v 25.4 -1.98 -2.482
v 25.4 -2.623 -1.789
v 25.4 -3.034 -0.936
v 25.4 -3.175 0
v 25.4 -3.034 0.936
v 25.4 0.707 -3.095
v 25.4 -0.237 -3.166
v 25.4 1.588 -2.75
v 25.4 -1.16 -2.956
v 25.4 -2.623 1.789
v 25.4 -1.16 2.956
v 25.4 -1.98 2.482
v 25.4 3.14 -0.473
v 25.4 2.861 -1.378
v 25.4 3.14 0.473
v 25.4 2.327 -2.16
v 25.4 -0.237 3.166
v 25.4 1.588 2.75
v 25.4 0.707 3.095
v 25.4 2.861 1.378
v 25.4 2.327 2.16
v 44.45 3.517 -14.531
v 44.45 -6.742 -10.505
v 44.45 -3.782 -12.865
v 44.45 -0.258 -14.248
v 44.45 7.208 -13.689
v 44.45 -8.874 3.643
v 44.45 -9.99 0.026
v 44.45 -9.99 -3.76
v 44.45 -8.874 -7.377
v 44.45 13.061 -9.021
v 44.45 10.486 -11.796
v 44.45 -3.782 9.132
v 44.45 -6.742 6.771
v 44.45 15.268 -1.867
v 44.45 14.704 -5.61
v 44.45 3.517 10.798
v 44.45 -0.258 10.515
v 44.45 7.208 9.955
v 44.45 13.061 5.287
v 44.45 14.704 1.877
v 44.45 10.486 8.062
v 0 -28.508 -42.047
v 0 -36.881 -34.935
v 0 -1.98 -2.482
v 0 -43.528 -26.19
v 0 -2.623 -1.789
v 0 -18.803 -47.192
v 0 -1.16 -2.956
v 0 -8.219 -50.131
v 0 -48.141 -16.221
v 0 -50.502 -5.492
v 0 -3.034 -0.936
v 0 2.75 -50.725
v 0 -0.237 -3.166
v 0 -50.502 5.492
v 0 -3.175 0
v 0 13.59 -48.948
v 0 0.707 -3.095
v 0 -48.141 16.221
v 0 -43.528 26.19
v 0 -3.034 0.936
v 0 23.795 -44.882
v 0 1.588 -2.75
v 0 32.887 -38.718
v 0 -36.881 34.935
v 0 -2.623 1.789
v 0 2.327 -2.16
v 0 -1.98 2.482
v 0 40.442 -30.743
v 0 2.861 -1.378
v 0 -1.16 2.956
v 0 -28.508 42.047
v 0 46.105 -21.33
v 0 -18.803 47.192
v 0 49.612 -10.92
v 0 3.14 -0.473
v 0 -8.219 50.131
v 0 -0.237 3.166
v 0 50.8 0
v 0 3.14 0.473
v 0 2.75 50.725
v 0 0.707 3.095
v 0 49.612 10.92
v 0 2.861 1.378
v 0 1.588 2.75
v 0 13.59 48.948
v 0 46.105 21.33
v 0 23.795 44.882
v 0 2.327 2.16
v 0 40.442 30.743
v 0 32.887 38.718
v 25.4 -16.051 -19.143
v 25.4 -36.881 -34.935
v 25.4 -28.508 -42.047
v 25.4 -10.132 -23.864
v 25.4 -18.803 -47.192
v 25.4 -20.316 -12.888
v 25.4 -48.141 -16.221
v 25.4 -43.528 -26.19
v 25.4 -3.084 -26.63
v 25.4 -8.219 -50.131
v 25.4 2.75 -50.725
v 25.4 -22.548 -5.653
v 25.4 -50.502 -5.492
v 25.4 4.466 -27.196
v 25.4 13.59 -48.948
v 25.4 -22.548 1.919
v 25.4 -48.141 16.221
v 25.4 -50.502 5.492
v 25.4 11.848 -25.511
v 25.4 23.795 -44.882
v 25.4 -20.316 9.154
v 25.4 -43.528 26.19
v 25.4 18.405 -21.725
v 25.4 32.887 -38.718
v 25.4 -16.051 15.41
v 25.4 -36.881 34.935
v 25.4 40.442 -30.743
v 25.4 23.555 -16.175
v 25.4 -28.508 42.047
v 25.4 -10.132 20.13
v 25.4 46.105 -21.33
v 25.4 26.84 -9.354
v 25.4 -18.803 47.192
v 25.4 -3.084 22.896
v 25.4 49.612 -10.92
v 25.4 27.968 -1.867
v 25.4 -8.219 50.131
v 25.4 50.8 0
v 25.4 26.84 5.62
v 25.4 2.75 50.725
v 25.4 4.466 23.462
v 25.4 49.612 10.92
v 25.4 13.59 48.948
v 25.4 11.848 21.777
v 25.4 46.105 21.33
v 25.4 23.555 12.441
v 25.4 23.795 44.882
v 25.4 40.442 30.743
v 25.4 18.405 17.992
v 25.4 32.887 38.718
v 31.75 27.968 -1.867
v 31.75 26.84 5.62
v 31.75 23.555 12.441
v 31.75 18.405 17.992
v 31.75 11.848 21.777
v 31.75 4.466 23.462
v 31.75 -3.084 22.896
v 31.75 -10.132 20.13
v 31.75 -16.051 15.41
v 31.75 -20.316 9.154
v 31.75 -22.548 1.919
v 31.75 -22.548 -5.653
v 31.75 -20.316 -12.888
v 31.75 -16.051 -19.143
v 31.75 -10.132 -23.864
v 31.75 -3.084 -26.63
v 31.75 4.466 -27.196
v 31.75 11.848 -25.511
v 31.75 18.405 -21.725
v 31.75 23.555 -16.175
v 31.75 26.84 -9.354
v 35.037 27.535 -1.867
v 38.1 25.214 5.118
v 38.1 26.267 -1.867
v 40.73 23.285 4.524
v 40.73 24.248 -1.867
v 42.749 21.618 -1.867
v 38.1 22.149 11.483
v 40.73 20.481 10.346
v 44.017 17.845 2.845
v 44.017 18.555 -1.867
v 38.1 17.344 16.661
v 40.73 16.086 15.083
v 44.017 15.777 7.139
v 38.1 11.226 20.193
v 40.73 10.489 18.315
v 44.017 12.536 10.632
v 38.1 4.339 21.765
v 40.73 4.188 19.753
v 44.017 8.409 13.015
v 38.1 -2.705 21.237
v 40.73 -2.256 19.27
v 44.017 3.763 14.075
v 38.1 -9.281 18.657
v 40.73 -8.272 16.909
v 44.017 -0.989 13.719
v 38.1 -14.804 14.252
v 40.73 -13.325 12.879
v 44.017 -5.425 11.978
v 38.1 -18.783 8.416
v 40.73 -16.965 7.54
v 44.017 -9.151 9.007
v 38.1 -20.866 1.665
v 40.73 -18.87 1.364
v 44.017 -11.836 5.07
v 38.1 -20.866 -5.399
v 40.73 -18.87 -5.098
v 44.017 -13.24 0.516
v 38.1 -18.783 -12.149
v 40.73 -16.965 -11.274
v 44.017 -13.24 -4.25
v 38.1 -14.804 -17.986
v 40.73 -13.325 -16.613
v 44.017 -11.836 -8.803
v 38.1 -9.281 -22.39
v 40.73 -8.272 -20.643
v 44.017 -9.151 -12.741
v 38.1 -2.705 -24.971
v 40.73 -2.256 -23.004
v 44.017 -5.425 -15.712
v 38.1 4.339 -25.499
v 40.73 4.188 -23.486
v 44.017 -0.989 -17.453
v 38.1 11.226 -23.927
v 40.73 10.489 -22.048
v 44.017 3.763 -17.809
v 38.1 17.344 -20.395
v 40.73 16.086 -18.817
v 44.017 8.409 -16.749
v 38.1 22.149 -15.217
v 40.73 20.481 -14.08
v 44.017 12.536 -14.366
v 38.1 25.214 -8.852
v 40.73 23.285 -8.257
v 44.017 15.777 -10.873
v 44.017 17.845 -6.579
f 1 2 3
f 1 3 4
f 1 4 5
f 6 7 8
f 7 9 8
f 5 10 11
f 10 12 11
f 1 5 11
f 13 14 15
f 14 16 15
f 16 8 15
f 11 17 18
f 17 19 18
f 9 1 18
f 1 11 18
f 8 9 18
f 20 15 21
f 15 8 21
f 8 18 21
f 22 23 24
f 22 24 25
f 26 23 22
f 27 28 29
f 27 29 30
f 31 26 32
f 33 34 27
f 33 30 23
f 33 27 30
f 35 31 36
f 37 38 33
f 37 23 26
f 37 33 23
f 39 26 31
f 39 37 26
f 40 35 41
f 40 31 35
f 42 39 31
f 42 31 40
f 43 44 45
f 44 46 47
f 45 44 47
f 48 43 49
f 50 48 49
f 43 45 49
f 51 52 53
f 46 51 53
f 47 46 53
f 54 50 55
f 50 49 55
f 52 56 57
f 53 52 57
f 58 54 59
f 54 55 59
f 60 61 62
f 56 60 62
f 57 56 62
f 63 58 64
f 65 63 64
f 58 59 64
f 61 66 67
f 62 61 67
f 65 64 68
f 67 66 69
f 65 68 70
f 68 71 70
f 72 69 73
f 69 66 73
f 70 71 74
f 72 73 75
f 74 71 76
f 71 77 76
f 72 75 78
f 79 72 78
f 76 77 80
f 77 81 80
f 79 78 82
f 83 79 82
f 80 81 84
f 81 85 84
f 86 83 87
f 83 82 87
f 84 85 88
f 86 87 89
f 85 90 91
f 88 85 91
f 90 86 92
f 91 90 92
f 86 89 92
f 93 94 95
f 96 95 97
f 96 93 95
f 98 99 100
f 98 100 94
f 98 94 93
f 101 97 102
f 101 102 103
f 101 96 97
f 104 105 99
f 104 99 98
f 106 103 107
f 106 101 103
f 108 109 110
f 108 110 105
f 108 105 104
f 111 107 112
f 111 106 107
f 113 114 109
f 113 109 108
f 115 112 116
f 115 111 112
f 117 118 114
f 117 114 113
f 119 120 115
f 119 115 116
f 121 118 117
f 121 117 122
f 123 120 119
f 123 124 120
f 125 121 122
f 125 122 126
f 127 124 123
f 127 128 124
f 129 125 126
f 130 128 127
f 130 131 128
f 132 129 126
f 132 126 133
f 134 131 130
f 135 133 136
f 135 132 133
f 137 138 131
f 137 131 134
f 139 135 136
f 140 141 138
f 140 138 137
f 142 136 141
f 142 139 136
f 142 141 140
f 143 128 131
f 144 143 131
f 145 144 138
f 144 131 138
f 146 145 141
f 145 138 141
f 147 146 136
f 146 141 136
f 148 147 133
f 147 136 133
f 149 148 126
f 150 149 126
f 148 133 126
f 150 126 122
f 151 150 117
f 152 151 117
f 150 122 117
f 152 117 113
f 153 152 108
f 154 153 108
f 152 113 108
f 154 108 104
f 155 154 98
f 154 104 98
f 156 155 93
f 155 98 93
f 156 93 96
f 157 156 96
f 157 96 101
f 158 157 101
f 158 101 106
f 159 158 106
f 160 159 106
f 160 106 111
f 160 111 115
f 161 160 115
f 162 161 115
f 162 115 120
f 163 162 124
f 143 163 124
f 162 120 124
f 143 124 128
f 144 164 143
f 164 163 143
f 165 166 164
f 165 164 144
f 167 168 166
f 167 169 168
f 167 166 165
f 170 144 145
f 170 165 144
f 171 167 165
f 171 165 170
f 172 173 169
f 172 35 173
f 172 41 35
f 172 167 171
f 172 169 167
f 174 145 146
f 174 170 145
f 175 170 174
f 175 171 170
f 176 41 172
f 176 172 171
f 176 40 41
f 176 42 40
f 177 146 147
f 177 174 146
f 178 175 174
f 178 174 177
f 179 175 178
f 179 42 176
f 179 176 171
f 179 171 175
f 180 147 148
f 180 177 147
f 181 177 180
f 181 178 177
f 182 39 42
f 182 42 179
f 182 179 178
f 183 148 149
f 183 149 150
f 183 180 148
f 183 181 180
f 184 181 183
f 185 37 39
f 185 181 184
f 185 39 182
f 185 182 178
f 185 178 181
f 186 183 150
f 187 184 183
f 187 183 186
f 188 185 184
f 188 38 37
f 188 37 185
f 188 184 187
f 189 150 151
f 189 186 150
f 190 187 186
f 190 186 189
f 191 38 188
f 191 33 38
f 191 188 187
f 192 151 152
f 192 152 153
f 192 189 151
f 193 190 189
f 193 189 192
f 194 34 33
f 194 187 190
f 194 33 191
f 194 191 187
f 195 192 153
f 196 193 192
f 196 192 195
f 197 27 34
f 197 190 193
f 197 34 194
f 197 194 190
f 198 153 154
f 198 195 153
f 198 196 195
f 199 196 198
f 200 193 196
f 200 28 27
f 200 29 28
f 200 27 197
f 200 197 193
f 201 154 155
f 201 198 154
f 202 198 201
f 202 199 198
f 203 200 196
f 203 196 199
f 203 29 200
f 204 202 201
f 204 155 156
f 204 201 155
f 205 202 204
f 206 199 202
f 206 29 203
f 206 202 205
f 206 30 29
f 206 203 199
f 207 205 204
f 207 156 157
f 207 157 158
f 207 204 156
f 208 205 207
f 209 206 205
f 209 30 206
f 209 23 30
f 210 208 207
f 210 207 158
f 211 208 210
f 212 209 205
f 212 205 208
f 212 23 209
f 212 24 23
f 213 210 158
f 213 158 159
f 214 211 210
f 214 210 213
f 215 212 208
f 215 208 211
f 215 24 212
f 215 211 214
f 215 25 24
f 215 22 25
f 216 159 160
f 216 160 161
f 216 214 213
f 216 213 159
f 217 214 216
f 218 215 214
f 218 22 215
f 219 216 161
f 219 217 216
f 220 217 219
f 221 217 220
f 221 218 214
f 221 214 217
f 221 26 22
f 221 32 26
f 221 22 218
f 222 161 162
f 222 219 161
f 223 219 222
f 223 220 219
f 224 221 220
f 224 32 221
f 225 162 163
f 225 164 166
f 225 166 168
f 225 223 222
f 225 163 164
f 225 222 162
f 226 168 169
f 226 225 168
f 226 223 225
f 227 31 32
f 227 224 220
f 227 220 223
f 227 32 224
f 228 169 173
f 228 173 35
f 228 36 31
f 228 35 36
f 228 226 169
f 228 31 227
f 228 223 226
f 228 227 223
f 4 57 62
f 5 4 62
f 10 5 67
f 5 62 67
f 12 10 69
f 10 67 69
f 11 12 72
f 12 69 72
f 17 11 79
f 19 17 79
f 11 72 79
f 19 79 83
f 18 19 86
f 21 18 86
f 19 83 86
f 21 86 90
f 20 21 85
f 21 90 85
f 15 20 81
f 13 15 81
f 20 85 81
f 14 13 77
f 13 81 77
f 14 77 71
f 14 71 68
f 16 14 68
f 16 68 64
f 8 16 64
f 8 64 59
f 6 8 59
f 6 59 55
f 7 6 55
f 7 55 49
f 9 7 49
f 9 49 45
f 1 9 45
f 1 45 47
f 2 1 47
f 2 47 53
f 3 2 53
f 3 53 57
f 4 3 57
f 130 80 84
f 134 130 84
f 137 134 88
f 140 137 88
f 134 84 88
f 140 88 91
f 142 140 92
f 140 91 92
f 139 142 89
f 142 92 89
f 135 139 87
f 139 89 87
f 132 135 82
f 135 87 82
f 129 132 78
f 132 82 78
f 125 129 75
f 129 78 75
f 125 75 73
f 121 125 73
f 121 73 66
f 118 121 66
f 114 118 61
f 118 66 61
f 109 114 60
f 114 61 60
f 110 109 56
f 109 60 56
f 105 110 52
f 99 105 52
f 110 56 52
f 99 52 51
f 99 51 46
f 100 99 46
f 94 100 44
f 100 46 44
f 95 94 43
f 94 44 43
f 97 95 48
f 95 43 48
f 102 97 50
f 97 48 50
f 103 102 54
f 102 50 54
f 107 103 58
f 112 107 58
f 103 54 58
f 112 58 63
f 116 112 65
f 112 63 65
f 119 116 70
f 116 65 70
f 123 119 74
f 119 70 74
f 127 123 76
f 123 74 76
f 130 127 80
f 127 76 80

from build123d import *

# Parameters (mm, degrees)
F0_R     = 50.8
F1_DEPTH = 25.4
F3_D     = 6.35
F4_R     = 25.4
F5_DEPTH = 19.05
F6_R     = 12.7


with BuildPart() as f1:
    # F0 (on Right) → F1 (new body)
    with BuildSketch(Plane.YZ):
        Circle(F0_R)
    extrude(amount=F1_DEPTH)

    # F3 (through all)
    with Locations(Plane.YZ.offset(25.4)):
        with Locations((0, 0)):
            Hole(F3_D / 2)

    # F4 (on face) → F5 (join)
    with BuildSketch(Plane.YZ.offset(25.4)):
        with Locations((2.568165, -1.866857)):
            Circle(F4_R)
    extrude(amount=F5_DEPTH)

    # F6
    f6_edges = [f1.edges().sort_by_distance(p)[0] for p in [
        (44.45, -22.831835, -1.866857),
    ]]
    fillet(f6_edges, radius=F6_R)


solid = f1.part
